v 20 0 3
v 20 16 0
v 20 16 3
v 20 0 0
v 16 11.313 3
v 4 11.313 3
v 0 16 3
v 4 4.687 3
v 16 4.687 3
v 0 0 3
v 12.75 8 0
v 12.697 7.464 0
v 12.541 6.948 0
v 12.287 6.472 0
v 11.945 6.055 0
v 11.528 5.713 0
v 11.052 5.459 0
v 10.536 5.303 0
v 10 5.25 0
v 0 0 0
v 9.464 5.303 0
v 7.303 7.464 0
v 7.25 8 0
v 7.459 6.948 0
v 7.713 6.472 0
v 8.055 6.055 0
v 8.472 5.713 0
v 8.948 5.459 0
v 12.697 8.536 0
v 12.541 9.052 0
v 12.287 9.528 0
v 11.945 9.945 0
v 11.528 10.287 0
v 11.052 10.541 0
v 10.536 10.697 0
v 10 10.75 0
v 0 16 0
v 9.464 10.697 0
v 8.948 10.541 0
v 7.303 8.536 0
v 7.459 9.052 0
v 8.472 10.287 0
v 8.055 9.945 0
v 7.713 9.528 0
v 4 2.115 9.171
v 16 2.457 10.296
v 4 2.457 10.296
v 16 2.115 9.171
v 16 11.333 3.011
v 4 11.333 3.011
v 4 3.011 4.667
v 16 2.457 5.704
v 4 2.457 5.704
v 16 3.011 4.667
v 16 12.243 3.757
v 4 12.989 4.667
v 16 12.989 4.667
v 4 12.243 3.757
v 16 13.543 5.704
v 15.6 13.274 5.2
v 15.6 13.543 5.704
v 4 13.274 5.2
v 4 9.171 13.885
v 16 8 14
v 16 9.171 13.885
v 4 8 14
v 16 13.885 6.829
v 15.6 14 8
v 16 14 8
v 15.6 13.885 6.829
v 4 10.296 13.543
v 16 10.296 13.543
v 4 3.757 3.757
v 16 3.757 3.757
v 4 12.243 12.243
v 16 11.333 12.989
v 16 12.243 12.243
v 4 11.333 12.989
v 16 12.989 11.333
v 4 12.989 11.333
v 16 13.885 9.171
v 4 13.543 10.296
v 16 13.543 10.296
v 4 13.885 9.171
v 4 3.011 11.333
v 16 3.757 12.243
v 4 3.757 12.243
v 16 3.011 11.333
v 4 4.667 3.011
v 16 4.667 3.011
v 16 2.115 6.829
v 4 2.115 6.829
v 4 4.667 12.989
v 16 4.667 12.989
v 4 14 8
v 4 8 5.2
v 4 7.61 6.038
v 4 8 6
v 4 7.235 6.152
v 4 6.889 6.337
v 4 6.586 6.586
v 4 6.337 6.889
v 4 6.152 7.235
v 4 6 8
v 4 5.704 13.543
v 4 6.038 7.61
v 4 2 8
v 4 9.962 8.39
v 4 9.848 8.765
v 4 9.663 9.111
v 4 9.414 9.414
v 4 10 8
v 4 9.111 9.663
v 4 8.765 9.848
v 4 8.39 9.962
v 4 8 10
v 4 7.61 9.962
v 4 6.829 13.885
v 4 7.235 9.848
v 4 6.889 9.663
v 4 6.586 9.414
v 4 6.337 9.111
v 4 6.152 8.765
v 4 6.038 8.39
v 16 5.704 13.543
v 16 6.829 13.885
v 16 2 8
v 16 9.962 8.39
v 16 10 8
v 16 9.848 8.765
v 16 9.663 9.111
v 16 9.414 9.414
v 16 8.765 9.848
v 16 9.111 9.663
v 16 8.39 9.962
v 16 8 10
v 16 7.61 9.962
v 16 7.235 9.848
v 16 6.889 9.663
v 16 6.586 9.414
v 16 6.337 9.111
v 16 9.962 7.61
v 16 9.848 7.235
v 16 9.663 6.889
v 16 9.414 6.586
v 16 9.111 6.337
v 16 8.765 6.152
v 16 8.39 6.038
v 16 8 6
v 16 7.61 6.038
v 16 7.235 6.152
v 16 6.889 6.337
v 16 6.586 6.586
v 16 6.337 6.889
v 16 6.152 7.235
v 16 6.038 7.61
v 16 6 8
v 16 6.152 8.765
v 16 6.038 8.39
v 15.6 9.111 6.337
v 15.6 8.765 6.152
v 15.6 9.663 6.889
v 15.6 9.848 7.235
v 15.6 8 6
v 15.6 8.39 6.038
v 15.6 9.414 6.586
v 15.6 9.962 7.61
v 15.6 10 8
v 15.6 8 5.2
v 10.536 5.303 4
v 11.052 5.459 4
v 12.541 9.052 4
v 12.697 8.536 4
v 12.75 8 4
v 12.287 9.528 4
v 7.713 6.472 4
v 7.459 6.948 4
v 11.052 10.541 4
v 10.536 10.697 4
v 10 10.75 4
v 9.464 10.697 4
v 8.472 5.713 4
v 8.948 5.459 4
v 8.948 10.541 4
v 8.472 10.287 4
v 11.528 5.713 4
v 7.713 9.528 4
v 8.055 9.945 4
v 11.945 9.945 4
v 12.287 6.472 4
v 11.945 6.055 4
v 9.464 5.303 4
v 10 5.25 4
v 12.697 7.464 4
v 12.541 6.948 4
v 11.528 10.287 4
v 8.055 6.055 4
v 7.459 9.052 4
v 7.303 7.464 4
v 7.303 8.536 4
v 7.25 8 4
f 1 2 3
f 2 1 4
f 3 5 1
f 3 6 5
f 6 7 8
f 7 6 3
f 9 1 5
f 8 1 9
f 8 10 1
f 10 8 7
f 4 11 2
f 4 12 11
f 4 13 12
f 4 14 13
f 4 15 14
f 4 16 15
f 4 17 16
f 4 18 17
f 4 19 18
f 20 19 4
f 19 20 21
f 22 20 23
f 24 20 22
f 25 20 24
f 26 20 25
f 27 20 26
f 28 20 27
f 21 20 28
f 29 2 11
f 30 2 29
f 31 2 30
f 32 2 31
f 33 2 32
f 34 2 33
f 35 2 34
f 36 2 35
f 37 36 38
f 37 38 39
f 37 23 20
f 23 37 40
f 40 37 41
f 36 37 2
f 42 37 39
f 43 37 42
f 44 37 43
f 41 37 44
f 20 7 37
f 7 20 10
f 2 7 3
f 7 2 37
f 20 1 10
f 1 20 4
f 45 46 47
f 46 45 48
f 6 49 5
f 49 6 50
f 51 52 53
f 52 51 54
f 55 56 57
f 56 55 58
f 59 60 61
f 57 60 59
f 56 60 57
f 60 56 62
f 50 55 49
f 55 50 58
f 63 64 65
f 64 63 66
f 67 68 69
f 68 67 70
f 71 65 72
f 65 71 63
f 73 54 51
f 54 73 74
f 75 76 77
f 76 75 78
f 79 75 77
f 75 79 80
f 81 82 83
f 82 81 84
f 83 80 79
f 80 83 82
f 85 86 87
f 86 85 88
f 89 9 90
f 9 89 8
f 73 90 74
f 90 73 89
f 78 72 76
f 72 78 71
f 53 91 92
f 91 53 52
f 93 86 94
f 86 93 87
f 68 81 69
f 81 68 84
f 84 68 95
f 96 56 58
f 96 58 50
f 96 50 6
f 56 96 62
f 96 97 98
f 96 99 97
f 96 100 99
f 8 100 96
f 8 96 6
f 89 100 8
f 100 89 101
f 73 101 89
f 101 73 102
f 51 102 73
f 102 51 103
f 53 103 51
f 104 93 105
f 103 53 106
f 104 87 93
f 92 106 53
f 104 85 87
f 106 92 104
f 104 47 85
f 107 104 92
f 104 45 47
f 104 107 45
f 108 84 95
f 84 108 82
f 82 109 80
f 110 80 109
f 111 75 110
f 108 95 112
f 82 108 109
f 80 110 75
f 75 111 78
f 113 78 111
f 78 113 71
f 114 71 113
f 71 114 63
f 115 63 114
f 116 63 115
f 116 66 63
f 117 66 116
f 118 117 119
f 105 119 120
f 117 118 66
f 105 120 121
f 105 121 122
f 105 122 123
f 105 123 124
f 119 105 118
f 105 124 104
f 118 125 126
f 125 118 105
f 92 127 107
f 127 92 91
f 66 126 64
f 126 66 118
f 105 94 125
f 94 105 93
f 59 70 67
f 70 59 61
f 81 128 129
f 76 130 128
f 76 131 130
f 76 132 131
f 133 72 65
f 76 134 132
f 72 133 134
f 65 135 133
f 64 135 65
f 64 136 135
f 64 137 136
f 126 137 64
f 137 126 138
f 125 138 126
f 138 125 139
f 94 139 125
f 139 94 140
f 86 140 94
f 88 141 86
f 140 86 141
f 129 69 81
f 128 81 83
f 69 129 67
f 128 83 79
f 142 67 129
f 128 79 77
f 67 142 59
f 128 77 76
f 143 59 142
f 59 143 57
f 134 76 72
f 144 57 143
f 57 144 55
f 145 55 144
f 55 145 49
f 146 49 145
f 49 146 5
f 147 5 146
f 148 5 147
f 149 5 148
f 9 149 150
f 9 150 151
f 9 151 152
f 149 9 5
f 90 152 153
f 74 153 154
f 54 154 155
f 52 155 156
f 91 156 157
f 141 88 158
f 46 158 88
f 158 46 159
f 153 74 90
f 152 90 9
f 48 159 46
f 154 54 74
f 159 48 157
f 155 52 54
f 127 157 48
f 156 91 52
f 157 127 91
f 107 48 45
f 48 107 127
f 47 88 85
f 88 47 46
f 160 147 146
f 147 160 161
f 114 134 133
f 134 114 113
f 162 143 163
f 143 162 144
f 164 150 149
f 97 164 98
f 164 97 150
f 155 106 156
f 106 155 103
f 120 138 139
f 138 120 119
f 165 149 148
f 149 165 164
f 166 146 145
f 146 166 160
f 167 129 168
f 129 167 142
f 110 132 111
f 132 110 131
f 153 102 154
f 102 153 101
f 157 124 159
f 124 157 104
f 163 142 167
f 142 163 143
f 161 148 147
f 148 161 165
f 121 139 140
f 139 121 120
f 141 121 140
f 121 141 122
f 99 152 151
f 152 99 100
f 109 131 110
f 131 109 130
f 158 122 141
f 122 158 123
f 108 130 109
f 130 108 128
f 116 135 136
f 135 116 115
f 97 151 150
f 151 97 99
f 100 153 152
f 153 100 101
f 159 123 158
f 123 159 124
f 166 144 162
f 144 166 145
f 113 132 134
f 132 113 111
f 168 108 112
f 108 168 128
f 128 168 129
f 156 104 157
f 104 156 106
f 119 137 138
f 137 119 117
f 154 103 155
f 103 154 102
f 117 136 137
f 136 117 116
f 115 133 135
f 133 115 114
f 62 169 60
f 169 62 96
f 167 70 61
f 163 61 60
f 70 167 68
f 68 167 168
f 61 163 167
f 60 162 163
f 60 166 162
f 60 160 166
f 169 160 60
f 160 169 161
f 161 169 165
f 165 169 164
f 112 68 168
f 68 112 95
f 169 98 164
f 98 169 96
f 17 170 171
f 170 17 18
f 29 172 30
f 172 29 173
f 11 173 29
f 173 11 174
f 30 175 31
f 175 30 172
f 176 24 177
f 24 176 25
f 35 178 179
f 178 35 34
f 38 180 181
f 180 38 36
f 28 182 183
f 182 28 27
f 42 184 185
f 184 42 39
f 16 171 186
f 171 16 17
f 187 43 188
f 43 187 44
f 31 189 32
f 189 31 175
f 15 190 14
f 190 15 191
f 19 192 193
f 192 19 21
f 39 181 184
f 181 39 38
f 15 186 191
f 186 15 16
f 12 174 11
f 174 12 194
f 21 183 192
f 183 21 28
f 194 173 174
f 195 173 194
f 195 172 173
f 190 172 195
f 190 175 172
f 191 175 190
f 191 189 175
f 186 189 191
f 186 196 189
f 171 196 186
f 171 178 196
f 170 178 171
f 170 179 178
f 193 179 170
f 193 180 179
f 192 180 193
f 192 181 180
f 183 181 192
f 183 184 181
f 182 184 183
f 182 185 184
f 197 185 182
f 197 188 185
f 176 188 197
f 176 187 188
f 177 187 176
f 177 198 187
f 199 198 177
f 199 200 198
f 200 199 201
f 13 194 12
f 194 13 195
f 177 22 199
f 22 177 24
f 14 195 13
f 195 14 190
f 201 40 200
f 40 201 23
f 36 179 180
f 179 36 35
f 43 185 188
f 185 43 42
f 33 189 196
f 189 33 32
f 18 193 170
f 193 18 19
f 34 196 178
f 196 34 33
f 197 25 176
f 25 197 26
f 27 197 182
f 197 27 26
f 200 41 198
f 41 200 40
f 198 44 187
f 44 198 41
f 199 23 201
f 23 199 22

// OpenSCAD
$fn = 32;

// ----------------------------------------------------------------------
// Cable clip: cable 4 mm, clamp 12 mm, base 20 mm
// ----------------------------------------------------------------------

// --- parameters (mm) ---
base_w = 20;              // base length, X
base_d = 16;              // base width, Y
base_t = 3;               // base thickness
clamp_d = 12;             // clamp outside diameter
wall_t = 4;               // clamp wall
cable_d = 4;              // cable opening
ring_w = 12;              // clamp width along the cable
screw_d = 5.5;            // screw clearance
throat = 2.8;             // snap throat width
sink = 1;                 // overlap of the clamp into the base

module base() {
  cube([base_w, base_d, base_t]);
}

module clamp() {
  translate([base_w / 2, base_d / 2, base_t + clamp_d / 2 - sink]) rotate([0, 90, 0])
    cylinder(h = ring_w, d = clamp_d, center = true);
}

difference() {
  union() {
    base();
    clamp();
  }
  translate([base_w / 2, base_d / 2, base_t + clamp_d / 2 - sink]) rotate([0, 90, 0]) translate([0, 0, -ring_w / 2 - 1]) cylinder(h = ring_w + 2, d = cable_d);
  /* snap throat: the opening is narrower than the cable */
  translate([base_w / 2 - throat / 2, base_d / 2, base_t + clamp_d / 2 - sink]) rotate([0, 90, 0]) translate([0, 0, -ring_w / 2 - 1]) cube([throat, clamp_d + 2, ring_w + 2]);
  translate([10, base_d / 2, -1]) cylinder(h = base_t + 2, d = screw_d);
}
